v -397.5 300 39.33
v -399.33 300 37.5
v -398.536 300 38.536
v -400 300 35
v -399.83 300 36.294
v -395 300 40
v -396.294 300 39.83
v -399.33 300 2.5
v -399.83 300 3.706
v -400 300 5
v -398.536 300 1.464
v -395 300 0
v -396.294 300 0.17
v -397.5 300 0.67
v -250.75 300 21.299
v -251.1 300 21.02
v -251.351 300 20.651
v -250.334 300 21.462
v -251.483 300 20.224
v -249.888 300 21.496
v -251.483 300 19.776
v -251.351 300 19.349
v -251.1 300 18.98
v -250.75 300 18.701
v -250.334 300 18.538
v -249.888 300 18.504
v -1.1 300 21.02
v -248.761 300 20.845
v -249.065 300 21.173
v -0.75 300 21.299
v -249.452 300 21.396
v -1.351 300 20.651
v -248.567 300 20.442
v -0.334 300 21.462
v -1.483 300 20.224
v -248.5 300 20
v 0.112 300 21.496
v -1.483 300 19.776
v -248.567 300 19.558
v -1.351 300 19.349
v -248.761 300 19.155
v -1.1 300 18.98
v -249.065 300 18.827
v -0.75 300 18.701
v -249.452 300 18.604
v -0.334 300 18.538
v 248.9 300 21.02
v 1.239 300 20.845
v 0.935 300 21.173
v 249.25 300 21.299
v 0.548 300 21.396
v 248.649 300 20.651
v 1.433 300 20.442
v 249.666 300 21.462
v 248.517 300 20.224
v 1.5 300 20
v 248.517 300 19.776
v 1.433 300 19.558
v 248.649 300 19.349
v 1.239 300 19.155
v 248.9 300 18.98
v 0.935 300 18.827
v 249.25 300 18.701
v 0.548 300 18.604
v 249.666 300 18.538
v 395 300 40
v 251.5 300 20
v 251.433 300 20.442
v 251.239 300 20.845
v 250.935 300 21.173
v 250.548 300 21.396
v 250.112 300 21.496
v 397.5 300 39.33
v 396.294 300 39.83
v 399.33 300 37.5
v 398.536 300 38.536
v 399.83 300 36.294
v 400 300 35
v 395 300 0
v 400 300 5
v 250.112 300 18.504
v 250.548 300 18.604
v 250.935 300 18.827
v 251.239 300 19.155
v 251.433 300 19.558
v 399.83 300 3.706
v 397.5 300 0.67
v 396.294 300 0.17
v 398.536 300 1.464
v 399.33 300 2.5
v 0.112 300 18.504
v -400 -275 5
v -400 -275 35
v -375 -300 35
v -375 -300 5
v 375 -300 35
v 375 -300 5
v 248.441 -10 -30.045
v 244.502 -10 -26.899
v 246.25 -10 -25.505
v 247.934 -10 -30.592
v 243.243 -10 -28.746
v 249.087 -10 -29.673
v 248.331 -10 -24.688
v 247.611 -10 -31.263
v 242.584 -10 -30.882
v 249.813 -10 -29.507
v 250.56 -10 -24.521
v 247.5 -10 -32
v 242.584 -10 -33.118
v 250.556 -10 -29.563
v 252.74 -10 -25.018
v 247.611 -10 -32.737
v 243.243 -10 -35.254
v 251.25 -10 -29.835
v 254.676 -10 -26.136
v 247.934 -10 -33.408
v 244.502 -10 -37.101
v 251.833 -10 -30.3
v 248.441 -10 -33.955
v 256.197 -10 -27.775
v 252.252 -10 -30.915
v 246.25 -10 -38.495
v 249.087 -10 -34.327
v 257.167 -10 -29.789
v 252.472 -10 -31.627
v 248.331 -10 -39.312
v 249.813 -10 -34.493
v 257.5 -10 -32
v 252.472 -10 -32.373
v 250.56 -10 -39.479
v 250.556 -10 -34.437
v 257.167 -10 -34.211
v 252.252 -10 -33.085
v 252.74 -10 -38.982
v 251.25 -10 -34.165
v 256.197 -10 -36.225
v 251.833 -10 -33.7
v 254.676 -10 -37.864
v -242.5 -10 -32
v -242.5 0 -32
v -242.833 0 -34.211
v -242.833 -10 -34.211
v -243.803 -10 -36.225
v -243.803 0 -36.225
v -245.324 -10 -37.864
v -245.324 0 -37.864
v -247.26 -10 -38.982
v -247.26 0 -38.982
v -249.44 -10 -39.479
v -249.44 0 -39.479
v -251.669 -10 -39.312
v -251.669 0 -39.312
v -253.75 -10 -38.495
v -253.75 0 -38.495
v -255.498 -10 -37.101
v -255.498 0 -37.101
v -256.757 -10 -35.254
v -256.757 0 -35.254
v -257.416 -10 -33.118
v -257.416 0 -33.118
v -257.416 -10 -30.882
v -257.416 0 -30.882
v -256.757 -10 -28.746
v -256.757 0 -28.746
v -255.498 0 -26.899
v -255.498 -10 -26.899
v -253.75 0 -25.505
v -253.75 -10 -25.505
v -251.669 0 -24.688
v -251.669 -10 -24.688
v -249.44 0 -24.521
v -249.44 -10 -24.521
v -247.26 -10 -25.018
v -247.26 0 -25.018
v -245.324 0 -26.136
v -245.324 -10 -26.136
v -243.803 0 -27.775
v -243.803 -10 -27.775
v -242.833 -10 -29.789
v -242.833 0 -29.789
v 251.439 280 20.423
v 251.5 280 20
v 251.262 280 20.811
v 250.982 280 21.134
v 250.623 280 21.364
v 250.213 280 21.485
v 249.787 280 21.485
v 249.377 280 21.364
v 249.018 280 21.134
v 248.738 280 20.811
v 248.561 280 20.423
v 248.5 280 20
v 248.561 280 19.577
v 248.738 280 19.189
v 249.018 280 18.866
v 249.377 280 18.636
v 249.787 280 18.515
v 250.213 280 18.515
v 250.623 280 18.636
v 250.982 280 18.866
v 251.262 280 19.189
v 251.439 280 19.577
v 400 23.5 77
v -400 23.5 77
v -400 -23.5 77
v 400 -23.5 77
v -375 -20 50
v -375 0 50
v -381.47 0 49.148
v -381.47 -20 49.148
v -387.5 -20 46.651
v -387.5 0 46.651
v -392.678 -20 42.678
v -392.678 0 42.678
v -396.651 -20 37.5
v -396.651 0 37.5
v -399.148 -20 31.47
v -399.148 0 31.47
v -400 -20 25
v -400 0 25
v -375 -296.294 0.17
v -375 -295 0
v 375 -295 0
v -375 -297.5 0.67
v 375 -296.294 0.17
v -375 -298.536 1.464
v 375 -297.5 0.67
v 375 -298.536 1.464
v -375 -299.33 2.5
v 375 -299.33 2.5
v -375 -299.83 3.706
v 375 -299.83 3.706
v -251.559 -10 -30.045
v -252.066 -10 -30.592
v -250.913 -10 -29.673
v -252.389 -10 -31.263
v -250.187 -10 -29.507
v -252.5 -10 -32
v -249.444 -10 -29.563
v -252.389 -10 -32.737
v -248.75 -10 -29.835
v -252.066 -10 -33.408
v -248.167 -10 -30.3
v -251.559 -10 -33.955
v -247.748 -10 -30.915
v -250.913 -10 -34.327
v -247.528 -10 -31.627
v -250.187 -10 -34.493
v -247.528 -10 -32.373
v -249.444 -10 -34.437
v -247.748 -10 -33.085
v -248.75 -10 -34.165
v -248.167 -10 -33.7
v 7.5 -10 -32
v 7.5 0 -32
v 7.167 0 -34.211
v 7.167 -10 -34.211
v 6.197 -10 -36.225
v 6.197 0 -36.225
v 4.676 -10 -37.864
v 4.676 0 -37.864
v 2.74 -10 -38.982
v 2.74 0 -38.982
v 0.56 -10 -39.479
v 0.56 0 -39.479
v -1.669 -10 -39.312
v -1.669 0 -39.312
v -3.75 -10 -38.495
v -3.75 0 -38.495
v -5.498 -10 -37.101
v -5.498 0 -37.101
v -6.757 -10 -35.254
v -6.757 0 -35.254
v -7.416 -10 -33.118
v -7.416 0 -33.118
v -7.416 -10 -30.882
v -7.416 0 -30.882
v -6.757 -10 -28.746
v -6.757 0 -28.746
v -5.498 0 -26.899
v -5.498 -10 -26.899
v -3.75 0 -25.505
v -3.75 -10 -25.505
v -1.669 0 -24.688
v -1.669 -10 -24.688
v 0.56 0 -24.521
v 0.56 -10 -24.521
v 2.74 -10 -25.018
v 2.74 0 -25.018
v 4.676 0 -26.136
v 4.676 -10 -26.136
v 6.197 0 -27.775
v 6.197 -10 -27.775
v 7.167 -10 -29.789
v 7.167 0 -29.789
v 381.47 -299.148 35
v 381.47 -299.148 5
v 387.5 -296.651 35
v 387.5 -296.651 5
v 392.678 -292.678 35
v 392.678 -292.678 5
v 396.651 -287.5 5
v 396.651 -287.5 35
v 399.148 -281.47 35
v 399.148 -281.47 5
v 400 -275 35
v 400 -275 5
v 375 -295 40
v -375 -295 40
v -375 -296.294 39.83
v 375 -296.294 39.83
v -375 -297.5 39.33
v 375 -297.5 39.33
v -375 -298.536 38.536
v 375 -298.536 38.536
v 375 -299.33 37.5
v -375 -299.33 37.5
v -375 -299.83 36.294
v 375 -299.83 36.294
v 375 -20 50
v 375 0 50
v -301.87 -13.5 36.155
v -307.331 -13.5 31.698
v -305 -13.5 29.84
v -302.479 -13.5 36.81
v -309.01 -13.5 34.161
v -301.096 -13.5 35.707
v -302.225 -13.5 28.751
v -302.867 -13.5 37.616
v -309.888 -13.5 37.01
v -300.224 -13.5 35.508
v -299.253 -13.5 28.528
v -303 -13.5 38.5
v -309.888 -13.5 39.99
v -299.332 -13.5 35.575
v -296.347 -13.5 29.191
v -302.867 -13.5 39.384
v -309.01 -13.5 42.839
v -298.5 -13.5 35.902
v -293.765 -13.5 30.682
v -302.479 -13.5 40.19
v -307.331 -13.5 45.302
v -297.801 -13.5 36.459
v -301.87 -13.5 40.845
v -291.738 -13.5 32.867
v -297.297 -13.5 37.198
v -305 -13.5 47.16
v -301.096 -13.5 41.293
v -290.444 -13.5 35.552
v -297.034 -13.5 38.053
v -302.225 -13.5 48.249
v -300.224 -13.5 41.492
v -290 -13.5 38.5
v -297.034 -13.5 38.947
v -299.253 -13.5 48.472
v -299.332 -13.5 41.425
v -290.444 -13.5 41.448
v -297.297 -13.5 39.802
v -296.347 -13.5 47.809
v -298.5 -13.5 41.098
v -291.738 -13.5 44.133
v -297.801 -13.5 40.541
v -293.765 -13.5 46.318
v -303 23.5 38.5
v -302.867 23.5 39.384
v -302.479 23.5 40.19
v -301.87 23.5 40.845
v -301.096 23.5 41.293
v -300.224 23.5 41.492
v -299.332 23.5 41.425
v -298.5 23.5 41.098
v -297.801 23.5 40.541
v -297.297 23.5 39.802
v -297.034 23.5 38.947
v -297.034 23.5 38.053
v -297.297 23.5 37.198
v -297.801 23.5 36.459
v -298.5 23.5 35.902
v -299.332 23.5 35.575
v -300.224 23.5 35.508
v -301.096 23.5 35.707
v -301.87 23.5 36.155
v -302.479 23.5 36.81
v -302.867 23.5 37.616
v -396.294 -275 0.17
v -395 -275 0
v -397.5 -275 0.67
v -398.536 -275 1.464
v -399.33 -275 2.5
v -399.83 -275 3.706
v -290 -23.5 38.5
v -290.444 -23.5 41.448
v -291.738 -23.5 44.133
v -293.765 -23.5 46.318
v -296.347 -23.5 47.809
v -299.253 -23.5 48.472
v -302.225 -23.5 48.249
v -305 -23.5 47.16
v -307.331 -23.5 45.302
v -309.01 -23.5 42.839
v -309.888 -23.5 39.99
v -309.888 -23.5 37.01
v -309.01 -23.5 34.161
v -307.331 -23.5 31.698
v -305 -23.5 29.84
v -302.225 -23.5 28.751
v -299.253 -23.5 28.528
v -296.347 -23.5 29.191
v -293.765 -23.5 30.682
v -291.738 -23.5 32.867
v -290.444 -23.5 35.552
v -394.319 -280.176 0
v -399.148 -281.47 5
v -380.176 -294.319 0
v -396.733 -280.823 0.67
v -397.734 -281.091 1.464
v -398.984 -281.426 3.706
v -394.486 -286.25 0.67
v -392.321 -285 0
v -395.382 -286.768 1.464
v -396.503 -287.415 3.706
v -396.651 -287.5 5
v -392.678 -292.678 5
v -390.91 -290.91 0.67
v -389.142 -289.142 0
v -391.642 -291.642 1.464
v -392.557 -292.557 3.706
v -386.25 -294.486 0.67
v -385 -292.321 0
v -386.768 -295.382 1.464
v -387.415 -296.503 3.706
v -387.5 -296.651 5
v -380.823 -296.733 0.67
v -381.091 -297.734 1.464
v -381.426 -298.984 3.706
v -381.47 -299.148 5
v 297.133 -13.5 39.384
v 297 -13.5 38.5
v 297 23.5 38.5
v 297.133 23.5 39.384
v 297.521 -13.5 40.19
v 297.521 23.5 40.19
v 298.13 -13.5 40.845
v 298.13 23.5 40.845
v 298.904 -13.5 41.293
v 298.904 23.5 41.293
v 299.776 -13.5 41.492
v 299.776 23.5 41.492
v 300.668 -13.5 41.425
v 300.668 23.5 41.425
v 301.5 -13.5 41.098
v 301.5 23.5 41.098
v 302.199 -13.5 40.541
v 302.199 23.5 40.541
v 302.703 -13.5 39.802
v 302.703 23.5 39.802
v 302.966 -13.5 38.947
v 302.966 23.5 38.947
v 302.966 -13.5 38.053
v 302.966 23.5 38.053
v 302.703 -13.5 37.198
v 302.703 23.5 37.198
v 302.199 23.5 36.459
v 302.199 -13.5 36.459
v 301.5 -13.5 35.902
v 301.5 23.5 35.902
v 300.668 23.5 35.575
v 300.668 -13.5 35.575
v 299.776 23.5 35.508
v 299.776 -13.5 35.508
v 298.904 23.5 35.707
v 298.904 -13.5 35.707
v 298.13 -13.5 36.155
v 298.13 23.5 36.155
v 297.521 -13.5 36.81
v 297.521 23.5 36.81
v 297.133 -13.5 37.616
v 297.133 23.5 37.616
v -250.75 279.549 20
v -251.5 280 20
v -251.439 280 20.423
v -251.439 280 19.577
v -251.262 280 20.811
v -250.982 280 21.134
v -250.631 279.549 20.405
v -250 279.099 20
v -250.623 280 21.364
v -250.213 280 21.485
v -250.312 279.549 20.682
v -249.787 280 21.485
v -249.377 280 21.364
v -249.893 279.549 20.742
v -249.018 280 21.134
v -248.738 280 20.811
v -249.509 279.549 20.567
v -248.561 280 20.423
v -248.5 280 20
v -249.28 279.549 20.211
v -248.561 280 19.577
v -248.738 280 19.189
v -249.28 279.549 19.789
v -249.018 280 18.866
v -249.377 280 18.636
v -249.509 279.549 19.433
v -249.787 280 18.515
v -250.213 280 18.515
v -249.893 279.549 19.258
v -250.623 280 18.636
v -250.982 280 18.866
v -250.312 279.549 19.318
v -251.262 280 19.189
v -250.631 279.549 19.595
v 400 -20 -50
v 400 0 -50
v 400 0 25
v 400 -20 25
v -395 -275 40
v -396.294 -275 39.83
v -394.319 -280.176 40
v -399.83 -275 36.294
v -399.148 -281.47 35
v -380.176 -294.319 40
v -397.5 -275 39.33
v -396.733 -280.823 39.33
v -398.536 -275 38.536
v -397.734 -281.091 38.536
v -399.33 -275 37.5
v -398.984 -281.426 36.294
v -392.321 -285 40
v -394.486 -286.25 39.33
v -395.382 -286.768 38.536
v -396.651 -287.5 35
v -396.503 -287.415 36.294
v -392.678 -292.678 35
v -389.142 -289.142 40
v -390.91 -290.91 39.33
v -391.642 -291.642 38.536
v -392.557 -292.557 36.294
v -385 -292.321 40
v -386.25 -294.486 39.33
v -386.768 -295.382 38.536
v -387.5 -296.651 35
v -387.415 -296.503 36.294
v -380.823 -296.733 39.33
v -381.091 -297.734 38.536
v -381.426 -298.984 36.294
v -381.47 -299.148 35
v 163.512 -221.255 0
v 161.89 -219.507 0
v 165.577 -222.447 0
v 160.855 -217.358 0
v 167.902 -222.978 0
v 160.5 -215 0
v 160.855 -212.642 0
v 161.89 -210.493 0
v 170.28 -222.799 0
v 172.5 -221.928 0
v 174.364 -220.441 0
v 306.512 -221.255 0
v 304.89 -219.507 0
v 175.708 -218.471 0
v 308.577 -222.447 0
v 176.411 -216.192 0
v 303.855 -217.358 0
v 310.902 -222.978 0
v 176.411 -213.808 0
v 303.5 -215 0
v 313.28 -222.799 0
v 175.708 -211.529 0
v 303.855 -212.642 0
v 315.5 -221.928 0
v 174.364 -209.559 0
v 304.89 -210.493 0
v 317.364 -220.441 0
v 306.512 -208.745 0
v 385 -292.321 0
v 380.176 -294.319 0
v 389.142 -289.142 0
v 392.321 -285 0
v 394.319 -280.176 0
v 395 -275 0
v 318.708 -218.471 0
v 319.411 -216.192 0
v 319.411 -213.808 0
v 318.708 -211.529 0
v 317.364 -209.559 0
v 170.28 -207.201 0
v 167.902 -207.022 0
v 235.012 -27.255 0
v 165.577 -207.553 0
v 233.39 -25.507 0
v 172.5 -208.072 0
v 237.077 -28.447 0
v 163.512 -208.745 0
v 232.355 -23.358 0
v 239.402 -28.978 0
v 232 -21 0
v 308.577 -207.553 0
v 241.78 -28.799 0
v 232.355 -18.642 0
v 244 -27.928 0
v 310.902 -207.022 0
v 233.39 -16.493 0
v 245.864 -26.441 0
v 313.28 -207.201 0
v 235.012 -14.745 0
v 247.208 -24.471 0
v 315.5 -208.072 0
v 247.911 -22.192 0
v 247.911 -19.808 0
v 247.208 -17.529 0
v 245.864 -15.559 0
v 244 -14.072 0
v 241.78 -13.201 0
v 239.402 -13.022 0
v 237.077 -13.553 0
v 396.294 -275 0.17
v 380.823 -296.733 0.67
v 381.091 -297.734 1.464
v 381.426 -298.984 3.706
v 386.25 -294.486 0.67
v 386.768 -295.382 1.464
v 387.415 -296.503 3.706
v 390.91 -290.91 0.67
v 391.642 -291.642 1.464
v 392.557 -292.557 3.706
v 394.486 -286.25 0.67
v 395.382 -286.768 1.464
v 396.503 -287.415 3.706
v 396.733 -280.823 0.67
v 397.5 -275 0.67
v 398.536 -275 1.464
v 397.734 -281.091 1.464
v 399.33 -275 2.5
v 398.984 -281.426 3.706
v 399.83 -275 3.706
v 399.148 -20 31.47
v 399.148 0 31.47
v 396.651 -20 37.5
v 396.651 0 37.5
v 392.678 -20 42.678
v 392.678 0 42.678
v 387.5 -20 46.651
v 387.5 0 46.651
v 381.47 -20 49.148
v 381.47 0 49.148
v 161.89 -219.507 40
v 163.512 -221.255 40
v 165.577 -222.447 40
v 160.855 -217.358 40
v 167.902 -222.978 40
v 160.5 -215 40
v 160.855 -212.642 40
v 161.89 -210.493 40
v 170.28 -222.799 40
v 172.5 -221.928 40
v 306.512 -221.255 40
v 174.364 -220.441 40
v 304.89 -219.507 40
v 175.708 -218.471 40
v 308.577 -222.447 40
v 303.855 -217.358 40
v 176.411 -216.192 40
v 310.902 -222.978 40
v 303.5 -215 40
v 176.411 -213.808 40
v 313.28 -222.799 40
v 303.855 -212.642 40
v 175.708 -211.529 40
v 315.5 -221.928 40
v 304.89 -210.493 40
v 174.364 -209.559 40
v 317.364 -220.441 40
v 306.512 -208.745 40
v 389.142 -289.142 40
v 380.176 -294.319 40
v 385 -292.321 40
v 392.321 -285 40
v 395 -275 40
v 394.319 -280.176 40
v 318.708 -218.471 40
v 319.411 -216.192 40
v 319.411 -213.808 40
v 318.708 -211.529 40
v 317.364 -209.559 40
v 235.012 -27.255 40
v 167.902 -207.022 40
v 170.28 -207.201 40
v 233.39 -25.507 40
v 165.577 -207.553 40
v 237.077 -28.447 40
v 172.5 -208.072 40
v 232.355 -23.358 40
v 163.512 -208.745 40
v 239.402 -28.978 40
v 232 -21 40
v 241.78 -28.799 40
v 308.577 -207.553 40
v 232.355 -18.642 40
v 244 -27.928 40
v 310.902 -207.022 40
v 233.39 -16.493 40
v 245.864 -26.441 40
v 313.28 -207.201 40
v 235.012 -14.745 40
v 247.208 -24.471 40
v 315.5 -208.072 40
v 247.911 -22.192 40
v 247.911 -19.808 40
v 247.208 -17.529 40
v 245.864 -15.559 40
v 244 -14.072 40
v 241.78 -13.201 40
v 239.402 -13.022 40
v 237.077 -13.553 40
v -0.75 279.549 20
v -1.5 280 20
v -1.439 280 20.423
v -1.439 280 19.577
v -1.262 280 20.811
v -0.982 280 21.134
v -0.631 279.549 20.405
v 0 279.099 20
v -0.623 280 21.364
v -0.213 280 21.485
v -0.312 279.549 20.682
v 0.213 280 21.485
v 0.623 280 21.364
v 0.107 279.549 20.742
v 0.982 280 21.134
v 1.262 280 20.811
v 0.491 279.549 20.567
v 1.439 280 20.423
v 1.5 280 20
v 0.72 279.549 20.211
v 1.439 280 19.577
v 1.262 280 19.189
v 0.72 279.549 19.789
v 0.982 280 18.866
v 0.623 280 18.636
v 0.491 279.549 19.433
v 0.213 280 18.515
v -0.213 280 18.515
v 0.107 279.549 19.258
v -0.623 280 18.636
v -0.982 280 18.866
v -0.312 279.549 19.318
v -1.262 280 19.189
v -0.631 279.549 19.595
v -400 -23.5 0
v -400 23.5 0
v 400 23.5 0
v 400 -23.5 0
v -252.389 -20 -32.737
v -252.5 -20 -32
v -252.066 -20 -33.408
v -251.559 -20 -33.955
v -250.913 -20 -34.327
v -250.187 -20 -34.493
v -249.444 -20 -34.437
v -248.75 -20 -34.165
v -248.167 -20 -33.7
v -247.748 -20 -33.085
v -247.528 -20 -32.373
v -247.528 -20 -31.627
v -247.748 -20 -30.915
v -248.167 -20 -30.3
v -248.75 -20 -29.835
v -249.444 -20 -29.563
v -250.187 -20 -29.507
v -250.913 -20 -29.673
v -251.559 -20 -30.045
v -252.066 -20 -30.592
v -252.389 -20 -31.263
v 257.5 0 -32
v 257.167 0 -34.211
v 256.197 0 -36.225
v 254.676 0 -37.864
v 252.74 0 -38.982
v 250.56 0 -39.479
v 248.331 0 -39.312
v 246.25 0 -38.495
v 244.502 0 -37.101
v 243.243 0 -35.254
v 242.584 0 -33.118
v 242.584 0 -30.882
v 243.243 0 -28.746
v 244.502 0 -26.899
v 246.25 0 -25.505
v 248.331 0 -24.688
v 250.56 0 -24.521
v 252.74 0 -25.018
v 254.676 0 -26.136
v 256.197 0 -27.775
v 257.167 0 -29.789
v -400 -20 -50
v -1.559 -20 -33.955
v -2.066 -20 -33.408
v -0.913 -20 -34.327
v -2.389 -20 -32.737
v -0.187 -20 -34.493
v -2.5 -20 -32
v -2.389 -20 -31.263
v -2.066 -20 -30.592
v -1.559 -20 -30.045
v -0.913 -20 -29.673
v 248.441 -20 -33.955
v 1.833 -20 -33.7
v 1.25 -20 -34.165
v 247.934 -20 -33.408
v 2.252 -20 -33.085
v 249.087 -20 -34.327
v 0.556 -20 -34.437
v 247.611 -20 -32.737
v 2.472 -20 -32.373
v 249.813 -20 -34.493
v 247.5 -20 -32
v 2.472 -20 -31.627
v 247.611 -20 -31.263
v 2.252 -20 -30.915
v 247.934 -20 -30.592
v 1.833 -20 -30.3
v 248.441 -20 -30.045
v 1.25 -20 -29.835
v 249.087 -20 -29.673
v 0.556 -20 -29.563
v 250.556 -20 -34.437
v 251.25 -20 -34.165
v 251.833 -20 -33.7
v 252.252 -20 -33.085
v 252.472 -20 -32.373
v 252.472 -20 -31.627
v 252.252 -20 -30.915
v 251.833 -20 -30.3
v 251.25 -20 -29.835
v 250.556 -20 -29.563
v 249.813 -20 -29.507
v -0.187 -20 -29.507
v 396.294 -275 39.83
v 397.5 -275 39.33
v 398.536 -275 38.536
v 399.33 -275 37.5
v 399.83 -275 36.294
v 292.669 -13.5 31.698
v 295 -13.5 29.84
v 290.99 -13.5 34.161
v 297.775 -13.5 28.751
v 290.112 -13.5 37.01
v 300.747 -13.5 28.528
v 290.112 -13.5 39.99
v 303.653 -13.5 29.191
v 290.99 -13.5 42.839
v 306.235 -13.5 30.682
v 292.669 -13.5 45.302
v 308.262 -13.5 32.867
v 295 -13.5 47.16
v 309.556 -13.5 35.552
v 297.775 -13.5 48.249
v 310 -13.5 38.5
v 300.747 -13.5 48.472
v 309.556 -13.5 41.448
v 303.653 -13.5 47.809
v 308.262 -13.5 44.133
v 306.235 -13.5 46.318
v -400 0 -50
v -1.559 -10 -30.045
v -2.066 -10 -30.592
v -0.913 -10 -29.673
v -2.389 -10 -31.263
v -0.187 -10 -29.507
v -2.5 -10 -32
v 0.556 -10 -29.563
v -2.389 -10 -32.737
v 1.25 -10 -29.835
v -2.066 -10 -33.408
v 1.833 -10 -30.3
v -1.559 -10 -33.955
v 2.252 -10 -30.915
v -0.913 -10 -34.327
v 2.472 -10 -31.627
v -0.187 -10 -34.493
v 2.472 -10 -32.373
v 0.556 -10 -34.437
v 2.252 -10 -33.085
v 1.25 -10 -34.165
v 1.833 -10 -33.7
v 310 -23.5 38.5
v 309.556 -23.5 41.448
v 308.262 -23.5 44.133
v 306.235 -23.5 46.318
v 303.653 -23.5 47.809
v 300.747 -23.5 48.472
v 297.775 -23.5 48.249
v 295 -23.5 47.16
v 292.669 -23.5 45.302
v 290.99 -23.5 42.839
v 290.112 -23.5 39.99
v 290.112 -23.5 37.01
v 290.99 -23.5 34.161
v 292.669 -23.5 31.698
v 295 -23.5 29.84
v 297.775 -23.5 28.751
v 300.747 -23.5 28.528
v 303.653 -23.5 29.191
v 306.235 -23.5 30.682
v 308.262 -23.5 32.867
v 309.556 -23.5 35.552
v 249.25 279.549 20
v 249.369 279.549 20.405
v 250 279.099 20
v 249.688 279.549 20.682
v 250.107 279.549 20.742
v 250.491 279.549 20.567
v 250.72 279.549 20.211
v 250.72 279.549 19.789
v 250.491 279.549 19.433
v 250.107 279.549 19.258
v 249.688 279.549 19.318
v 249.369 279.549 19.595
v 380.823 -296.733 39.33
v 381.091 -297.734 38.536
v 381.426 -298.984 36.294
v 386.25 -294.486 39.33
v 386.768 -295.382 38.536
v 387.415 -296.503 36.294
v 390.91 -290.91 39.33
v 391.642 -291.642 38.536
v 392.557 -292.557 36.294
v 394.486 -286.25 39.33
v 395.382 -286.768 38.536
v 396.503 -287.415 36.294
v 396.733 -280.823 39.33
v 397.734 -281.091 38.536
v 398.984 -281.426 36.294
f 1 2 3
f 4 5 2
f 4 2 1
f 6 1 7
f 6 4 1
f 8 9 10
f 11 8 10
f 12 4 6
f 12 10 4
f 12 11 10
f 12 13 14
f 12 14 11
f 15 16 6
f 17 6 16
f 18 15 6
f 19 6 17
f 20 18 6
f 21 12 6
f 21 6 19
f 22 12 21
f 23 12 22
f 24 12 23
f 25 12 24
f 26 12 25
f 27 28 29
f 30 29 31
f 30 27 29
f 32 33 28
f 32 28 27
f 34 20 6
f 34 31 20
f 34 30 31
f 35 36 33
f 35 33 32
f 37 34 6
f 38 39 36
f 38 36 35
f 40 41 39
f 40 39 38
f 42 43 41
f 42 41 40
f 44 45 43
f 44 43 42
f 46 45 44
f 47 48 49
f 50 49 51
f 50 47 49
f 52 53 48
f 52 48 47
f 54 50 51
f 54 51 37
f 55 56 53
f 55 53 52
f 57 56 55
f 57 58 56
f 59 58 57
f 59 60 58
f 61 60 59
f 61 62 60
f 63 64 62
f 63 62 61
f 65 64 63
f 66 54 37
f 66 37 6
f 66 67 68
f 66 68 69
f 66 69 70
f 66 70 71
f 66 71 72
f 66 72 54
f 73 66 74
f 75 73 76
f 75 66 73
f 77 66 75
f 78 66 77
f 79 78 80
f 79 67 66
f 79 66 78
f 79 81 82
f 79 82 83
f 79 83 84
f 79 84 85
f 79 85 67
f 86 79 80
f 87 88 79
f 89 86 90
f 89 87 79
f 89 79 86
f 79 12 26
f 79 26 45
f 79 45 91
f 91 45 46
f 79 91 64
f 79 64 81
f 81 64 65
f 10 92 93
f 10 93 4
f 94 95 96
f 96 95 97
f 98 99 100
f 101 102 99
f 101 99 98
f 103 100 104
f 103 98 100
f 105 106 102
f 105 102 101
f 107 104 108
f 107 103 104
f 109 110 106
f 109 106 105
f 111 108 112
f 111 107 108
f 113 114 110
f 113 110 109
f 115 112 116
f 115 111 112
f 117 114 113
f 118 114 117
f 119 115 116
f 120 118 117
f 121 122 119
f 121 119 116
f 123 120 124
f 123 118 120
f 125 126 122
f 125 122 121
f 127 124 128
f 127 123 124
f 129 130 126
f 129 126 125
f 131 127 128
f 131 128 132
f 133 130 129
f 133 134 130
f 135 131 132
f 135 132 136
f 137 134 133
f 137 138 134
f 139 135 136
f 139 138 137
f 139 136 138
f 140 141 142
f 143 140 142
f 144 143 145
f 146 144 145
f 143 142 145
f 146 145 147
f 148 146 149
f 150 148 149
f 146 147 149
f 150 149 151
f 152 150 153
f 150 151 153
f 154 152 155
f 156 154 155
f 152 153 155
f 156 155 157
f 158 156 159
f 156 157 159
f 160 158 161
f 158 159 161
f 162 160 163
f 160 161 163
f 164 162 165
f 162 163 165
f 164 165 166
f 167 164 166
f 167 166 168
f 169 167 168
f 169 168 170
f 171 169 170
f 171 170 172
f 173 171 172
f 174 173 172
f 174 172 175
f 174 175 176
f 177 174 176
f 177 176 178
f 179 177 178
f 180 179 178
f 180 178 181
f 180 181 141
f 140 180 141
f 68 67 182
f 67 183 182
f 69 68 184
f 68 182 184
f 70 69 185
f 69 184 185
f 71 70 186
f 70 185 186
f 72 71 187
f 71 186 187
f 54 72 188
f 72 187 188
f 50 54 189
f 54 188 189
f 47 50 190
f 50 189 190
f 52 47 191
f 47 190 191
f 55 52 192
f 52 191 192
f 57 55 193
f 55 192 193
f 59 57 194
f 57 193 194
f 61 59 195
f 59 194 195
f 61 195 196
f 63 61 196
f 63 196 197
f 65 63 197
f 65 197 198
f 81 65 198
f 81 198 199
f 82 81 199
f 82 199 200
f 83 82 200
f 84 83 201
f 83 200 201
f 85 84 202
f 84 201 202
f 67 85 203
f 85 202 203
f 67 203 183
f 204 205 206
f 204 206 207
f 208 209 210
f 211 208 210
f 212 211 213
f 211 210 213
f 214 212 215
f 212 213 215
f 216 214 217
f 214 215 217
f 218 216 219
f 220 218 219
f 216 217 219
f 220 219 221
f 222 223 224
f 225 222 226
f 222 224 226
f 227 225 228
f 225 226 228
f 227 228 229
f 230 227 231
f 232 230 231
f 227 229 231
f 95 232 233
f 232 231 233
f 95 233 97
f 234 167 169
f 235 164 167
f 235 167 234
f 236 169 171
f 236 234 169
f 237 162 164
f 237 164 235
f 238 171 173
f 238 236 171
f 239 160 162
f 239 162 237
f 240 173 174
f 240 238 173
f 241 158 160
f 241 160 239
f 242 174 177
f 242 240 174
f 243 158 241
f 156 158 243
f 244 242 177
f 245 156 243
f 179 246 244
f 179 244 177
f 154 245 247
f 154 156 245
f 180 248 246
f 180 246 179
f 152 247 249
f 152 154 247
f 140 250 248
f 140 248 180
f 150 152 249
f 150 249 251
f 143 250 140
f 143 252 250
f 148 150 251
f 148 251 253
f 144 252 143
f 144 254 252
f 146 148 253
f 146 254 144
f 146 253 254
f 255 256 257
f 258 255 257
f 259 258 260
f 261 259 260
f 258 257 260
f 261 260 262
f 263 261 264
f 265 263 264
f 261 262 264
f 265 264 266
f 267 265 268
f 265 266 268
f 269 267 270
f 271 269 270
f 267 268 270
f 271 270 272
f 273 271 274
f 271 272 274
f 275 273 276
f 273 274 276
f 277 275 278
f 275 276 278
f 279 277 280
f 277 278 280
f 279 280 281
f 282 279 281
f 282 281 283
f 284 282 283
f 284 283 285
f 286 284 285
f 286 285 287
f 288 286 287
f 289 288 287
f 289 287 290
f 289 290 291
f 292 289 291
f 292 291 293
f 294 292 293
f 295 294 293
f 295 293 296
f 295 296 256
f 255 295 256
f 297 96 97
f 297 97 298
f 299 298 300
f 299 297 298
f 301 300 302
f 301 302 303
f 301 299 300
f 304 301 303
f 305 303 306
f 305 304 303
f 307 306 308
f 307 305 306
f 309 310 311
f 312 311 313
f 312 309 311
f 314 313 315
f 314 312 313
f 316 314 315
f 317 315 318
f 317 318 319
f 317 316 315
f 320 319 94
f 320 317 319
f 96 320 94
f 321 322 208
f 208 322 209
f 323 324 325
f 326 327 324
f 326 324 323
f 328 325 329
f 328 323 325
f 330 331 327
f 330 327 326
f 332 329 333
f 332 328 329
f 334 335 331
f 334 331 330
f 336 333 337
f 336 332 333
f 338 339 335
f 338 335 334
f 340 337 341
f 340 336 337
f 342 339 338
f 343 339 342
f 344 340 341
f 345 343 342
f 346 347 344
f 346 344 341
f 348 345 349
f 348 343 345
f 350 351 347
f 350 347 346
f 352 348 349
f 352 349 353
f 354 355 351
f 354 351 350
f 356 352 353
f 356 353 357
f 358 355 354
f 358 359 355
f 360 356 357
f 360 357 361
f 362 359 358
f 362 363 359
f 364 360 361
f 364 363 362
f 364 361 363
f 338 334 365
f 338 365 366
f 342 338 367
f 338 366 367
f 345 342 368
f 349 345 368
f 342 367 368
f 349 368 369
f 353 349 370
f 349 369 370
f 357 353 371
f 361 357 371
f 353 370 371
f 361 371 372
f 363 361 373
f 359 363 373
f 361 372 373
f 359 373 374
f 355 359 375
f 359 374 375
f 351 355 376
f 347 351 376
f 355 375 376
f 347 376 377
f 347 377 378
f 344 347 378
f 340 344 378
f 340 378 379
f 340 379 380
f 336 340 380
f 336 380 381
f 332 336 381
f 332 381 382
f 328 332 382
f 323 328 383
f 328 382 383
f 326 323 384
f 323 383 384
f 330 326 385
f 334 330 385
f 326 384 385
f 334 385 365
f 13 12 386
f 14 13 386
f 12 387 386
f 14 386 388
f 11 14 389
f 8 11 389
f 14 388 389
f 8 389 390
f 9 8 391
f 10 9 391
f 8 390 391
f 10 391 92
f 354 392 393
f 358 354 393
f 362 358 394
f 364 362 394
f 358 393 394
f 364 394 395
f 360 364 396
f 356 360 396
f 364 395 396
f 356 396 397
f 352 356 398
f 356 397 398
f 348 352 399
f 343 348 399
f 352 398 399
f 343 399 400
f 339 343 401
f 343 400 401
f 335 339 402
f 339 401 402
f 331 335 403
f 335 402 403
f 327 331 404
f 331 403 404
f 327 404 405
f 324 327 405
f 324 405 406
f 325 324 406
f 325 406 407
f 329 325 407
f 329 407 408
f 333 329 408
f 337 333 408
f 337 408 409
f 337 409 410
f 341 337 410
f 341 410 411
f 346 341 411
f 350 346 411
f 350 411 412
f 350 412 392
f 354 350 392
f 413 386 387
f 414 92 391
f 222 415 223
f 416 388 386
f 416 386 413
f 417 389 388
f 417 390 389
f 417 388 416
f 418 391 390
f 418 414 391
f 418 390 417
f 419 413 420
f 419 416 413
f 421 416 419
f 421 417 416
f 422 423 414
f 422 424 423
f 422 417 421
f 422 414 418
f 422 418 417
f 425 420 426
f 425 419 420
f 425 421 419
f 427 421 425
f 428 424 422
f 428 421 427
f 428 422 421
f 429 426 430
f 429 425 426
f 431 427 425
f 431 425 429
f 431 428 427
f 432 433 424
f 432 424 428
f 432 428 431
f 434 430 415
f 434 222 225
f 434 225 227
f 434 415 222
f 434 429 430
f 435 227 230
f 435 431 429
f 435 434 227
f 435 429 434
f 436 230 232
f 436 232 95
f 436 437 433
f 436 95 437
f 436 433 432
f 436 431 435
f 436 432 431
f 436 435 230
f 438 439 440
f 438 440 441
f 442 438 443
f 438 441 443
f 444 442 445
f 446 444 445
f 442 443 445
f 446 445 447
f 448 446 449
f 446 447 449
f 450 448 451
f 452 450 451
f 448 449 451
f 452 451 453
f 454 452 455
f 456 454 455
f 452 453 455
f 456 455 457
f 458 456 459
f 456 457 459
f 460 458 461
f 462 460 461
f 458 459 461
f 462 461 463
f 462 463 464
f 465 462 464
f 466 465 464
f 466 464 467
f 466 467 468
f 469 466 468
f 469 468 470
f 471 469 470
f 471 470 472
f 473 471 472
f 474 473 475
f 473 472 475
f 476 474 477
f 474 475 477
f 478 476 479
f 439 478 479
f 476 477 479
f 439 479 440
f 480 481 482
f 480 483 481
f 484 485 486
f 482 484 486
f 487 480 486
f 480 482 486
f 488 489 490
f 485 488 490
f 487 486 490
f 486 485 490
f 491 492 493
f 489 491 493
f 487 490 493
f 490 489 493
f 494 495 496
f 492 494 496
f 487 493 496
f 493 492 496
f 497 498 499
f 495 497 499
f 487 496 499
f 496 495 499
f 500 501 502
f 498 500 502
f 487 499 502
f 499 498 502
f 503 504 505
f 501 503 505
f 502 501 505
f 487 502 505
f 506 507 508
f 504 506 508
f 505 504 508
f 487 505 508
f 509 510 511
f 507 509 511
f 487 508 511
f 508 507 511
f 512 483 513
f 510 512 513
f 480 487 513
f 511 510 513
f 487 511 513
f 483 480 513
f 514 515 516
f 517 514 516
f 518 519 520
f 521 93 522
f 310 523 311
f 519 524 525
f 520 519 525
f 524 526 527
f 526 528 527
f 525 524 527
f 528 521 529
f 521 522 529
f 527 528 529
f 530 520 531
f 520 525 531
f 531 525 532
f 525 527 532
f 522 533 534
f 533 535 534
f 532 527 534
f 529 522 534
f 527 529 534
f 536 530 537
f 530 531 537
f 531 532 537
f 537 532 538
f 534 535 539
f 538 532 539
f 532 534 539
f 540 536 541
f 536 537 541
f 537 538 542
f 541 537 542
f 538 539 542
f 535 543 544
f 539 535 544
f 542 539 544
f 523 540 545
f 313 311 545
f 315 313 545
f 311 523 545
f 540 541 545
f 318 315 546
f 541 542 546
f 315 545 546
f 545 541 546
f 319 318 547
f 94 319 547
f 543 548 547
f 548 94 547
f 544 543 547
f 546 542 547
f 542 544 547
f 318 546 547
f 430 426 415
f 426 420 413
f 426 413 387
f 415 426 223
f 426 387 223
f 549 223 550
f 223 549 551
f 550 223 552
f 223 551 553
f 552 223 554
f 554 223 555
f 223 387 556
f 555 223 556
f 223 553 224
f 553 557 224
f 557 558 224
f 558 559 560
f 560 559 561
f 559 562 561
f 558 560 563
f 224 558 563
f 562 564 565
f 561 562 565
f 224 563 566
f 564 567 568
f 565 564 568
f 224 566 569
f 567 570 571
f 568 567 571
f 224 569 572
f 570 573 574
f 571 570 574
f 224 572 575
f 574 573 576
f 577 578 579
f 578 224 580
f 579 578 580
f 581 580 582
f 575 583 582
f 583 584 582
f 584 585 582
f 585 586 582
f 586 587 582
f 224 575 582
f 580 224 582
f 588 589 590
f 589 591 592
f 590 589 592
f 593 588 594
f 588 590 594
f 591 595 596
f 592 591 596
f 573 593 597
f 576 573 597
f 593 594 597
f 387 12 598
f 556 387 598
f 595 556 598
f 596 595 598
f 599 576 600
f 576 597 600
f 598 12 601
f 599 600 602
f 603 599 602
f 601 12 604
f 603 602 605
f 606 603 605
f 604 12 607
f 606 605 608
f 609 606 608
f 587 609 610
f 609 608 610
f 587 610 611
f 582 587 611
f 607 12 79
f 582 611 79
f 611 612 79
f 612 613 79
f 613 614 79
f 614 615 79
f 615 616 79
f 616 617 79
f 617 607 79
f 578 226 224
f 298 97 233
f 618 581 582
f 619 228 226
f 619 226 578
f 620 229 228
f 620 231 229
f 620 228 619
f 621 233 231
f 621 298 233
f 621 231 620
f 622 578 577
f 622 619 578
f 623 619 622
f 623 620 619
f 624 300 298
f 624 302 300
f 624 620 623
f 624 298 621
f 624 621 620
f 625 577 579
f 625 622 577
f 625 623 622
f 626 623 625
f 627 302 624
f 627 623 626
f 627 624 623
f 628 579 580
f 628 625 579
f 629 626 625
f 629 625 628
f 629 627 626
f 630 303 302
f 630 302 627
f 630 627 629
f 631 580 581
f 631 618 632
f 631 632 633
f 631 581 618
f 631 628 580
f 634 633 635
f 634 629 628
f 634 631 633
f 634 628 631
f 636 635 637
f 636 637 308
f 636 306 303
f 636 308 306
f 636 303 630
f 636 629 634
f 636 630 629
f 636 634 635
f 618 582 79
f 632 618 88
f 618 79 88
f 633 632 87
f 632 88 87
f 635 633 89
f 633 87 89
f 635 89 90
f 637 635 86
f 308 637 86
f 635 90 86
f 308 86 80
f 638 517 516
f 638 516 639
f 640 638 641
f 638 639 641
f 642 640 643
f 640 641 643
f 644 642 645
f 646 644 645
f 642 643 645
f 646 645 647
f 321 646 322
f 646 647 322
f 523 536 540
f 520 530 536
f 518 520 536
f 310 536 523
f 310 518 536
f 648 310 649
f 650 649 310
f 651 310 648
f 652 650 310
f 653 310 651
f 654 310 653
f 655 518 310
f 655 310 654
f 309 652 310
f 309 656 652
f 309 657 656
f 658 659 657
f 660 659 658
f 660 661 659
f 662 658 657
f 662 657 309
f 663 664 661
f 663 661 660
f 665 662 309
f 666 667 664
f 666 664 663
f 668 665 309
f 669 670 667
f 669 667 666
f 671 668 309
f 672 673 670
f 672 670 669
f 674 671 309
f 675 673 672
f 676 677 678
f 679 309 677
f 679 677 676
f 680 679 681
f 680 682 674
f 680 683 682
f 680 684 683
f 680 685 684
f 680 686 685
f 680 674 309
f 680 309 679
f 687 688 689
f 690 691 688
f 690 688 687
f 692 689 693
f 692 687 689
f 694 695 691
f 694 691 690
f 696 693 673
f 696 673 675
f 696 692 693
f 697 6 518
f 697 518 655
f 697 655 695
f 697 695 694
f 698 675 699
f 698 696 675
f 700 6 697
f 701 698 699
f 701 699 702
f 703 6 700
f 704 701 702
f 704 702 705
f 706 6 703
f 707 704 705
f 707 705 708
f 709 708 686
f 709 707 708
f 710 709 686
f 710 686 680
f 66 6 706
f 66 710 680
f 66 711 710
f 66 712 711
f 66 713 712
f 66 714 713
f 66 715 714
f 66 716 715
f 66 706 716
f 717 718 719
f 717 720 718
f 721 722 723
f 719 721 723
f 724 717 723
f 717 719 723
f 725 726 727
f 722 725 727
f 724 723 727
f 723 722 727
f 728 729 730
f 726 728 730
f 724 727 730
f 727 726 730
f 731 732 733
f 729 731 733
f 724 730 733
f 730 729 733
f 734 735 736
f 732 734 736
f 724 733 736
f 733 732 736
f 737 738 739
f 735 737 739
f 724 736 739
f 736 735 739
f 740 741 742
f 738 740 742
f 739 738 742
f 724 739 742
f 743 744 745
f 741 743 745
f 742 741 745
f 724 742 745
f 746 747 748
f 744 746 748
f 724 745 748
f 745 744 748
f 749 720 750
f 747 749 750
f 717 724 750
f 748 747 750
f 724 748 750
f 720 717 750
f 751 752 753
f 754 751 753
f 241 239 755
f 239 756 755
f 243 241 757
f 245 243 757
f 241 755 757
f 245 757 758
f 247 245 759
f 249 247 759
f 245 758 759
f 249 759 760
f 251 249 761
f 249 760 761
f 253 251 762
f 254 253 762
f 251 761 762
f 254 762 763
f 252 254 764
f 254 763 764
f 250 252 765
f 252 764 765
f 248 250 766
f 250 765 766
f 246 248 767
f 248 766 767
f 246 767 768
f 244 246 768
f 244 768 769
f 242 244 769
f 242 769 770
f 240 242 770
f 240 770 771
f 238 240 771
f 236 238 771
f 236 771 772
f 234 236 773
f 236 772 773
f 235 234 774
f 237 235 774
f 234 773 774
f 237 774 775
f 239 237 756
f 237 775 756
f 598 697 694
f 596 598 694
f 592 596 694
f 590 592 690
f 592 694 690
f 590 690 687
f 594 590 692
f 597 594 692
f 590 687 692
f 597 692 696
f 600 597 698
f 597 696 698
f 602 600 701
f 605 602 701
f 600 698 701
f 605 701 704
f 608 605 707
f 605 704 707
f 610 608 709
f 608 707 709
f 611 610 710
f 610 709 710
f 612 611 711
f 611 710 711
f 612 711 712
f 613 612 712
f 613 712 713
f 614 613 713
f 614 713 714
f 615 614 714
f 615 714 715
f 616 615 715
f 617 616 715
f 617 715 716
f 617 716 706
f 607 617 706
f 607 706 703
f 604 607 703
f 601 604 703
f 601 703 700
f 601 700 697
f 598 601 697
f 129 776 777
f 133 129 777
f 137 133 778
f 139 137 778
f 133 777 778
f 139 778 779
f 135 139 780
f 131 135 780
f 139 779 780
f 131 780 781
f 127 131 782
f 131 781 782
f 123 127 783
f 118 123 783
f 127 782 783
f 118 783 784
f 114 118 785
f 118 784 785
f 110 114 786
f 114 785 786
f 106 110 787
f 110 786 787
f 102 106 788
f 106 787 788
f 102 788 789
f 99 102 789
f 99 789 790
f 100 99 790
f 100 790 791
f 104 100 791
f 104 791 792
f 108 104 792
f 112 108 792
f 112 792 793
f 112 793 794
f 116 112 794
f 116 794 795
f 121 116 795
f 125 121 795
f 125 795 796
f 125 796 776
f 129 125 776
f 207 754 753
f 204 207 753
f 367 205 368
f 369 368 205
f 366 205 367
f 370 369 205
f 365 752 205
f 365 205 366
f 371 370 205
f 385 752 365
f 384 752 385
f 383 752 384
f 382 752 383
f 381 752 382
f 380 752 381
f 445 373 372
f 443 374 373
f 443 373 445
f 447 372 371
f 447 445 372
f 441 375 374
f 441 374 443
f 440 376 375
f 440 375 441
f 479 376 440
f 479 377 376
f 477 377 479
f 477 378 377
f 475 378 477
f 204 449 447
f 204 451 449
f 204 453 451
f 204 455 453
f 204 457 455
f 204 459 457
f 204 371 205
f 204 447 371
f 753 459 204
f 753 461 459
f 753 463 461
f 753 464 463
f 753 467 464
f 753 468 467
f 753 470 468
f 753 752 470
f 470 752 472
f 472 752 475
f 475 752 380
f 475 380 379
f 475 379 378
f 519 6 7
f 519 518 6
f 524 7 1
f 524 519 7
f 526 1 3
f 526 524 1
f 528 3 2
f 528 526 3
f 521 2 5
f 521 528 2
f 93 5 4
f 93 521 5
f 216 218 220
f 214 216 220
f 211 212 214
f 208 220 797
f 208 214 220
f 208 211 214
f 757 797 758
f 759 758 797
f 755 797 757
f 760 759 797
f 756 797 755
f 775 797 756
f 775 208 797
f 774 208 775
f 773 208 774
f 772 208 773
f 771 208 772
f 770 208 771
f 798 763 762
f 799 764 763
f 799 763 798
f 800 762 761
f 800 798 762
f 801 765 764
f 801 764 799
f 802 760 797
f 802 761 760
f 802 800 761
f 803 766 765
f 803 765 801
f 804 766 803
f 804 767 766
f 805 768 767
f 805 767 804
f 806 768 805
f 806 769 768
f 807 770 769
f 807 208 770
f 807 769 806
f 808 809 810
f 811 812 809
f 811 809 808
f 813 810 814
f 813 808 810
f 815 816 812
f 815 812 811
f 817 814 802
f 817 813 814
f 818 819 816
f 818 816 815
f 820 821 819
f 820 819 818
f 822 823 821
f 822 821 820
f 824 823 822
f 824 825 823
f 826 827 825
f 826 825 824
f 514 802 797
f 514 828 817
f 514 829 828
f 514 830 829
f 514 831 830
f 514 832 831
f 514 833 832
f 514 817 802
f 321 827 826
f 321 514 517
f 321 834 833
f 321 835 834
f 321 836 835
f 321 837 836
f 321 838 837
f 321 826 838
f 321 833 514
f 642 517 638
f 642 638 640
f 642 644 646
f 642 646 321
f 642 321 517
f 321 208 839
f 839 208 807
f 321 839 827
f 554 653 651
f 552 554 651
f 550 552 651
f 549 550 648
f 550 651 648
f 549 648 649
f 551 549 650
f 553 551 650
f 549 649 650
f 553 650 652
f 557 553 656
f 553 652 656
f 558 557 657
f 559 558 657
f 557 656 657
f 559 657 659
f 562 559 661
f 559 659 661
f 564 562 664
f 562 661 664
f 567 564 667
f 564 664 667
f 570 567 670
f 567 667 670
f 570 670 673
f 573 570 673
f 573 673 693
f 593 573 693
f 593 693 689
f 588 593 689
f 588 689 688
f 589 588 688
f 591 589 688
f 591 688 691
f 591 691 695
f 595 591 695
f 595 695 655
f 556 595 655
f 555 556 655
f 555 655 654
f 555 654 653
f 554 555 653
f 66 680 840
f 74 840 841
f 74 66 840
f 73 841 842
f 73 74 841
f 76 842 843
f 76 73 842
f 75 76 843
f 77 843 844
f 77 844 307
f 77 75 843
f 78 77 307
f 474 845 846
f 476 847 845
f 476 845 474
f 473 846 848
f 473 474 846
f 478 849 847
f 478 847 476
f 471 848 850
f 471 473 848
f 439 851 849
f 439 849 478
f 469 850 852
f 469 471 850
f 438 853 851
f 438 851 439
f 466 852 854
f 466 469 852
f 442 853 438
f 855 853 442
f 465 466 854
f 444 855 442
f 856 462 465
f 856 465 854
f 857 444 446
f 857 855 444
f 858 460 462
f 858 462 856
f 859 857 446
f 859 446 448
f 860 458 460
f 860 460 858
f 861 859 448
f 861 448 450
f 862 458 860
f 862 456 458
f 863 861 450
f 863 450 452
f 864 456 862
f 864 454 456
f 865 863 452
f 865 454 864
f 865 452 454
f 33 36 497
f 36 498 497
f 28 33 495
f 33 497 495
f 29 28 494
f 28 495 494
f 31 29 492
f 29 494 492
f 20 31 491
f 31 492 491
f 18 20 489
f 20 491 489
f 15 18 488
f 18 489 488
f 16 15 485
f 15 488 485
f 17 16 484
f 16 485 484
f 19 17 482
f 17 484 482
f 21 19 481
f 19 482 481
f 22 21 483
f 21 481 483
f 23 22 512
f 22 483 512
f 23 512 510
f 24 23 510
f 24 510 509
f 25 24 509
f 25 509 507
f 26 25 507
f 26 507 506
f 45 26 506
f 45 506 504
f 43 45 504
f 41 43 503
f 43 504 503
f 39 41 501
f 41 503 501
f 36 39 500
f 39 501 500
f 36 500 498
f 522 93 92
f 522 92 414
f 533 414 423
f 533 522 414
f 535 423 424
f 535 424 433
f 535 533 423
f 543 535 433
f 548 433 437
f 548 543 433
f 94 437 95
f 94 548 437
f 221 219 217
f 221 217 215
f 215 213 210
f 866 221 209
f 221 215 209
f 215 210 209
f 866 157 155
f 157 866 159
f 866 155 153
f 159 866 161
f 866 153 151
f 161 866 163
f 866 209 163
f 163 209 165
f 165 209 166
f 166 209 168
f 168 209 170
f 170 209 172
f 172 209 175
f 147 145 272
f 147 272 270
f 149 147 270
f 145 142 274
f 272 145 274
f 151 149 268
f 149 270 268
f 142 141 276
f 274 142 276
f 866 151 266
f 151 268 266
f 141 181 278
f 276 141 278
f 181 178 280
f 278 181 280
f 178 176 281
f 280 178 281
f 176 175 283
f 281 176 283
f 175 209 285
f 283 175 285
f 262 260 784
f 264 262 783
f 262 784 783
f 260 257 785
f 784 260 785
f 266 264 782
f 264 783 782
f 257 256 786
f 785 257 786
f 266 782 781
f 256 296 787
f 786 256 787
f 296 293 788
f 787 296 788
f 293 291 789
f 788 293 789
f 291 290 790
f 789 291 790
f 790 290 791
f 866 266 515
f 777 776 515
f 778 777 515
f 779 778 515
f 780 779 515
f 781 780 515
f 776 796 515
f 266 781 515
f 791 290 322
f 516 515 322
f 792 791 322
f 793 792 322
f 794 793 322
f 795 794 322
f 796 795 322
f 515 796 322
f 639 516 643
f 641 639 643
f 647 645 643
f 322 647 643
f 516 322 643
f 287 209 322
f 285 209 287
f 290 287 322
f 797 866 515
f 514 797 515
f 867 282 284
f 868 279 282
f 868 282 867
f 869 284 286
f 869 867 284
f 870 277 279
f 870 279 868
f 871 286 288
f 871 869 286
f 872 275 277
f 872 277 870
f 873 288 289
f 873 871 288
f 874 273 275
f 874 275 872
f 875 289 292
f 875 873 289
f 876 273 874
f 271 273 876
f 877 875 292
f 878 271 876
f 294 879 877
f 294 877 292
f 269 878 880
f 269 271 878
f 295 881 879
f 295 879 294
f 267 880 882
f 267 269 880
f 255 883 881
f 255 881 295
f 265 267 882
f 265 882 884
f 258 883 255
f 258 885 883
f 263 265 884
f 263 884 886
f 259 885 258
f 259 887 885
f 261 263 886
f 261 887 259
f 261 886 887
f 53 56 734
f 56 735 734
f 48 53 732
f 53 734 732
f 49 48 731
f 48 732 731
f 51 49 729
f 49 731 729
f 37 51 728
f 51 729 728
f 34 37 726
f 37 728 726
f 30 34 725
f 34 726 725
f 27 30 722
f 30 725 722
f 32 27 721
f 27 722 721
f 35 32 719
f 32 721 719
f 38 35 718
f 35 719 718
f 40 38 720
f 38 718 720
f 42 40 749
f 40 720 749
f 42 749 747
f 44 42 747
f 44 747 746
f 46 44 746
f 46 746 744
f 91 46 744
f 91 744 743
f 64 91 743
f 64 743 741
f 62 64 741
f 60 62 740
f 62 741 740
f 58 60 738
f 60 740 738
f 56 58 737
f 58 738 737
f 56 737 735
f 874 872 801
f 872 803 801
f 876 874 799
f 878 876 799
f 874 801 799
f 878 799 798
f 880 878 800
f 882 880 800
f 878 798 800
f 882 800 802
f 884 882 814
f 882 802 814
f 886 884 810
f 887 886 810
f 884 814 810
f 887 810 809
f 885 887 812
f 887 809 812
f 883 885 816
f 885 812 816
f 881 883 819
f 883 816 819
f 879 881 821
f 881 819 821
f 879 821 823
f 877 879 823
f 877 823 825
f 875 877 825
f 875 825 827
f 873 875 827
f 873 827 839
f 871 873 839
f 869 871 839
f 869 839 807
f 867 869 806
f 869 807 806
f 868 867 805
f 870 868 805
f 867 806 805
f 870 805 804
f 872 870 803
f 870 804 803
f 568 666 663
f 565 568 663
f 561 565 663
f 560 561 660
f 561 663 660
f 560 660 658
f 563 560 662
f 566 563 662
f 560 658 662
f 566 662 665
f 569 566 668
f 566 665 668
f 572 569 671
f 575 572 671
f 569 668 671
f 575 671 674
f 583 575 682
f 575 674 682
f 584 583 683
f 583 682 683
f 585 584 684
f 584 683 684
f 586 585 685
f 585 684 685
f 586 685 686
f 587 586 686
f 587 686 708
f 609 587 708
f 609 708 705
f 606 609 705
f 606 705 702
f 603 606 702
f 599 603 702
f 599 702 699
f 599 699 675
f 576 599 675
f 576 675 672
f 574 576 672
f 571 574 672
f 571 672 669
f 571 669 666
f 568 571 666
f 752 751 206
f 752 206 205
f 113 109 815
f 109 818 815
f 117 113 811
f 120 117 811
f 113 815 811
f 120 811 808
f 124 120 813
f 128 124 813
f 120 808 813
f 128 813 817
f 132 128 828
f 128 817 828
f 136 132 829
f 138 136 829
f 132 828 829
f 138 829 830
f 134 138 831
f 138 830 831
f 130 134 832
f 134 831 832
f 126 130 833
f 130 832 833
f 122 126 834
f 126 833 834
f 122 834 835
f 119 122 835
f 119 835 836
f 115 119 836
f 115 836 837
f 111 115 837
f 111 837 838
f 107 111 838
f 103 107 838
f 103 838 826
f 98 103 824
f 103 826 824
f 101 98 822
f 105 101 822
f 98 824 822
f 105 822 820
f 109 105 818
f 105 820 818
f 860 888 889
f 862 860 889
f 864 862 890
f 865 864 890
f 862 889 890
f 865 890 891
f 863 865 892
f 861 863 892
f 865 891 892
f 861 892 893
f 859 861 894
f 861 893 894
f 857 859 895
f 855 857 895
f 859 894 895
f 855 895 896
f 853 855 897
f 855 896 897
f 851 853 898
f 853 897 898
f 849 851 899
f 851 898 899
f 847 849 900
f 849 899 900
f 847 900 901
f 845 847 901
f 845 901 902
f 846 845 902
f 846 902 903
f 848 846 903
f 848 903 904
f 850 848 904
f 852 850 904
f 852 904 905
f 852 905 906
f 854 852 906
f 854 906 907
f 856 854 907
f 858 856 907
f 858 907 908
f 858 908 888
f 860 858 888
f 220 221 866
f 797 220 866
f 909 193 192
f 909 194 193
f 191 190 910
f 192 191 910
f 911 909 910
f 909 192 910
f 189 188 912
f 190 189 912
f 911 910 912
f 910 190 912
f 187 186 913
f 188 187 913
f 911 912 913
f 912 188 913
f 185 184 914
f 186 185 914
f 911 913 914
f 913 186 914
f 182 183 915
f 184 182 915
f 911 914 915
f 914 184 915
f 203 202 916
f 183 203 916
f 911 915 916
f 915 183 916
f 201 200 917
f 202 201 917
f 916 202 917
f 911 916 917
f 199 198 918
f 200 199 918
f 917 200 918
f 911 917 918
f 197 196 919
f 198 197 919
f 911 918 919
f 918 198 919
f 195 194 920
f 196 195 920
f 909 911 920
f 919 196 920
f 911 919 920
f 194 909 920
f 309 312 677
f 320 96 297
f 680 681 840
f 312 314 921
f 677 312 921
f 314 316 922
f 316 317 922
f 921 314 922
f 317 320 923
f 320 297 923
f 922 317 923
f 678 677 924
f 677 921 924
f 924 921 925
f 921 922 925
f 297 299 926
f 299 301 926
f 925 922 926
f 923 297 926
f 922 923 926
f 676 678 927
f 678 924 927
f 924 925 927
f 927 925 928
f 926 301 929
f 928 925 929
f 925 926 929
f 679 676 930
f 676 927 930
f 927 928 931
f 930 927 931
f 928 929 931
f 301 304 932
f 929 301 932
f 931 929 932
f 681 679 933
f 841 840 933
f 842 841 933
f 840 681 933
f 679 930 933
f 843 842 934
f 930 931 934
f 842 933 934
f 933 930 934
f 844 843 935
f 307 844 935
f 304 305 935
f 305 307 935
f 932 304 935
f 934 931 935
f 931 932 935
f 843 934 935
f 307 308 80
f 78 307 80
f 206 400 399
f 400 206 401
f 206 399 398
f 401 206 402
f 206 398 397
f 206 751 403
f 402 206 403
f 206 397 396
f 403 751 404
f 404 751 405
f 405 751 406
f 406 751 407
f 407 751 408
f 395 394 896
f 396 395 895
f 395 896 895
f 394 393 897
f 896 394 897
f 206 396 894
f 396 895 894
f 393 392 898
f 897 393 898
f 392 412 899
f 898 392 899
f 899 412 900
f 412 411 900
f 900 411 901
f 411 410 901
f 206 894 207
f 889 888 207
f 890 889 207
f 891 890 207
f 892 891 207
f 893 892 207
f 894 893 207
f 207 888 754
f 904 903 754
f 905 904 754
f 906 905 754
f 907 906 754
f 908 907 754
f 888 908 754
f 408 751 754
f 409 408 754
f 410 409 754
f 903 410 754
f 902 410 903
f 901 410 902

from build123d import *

# Parameters (mm, degrees)
F0_W            = 800
F0_H            = 600
F1_DEPTH        = 40
F2_R            = 25
F3_R            = 5
F5_D            = 3
F5_DEPTH        = 20
F5_TIP          = 0.9012909285
F7_DEPTH        = 20
F8_D            = 5
F8_CBORE_D      = 15
F8_CBORE_DEPTH  = 10
F9_W            = 800
F9_H            = 47
F10_DEPTH       = 77
F12_D           = 6
F12_CBORE_D     = 20
F12_CBORE_DEPTH = 10
F13_D           = 16


with BuildPart() as f1:
    # F0 (on Top) → F1 (new body)
    with BuildSketch(Plane.XY):
        Rectangle(F0_W, F0_H)
    extrude(amount=F1_DEPTH)

    # F2
    f2_edges = [f1.edges().sort_by_distance(p)[0] for p in [
        (400, -300, 20),
        (-400, -300, 20),
    ]]
    fillet(f2_edges, radius=F2_R)

    # F3
    f3_edges = [f1.edges().sort_by_distance(p)[0] for p in [
        (400, 12.5, 40),
        (0, -300, 0),
    ]]
    fillet(f3_edges, radius=F3_R)

    # F5
    with Locations(Plane(origin=(0, 300, 0), x_dir=(-1, 0, 0), z_dir=(0, 1, 0))):
        with Locations((-250, 20), (0, 20), (250, 20)):
            Hole(F5_D / 2, depth=F5_DEPTH)
            with Locations((0, 0, -(F5_DEPTH + F5_TIP / 2))):  # 118° drill point
                Cone(0, F5_D / 2, F5_TIP, mode=Mode.SUBTRACT)

    # F13 (through all)
    with Locations(Plane(origin=(0, 0, 0), x_dir=(1, 0, 0), z_dir=(0, 0, -1))):
        with Locations((168.5, 215), (311.5, 215), (240, 21)):
            Hole(F13_D / 2)


with BuildPart() as f7:
    # F6 (on Front) → F7 (new body)
    with BuildSketch(Plane.XZ):
        with BuildLine():
            ThreePointArc((400, 25), (392.6776695297, 42.6776695297), (375, 50))
            Line((375, 50), (-375, 50))
            ThreePointArc((-375, 50), (-392.6776695297, 42.6776695297), (-400, 25))
            Line((-400, 25), (-400, -50))
            Line((-400, -50), (400, -50))
            Line((400, -50), (400, 25))
        make_face()
    extrude(amount=F7_DEPTH)

    # F8 (through all)
    with Locations(Plane(origin=(0, 0, 0), x_dir=(1, 0, 0), z_dir=(0, 1, 0))):
        with Locations((250, 32), (0, 32), (-250, 32)):
            CounterBoreHole(F8_D / 2, F8_CBORE_D / 2, F8_CBORE_DEPTH)


with BuildPart() as f10:
    # F9 (on Top) → F10 (new body)
    with BuildSketch(Plane.XY):
        Rectangle(F9_W, F9_H)
    extrude(amount=F10_DEPTH)

    # F12 (through all)
    with Locations(Plane.XZ.offset(23.5)):
        with Locations((-300, 38.5), (300, 38.5)):
            CounterBoreHole(F12_D / 2, F12_CBORE_D / 2, F12_CBORE_DEPTH)


solid = Compound([f1.part, f7.part, f10.part])
